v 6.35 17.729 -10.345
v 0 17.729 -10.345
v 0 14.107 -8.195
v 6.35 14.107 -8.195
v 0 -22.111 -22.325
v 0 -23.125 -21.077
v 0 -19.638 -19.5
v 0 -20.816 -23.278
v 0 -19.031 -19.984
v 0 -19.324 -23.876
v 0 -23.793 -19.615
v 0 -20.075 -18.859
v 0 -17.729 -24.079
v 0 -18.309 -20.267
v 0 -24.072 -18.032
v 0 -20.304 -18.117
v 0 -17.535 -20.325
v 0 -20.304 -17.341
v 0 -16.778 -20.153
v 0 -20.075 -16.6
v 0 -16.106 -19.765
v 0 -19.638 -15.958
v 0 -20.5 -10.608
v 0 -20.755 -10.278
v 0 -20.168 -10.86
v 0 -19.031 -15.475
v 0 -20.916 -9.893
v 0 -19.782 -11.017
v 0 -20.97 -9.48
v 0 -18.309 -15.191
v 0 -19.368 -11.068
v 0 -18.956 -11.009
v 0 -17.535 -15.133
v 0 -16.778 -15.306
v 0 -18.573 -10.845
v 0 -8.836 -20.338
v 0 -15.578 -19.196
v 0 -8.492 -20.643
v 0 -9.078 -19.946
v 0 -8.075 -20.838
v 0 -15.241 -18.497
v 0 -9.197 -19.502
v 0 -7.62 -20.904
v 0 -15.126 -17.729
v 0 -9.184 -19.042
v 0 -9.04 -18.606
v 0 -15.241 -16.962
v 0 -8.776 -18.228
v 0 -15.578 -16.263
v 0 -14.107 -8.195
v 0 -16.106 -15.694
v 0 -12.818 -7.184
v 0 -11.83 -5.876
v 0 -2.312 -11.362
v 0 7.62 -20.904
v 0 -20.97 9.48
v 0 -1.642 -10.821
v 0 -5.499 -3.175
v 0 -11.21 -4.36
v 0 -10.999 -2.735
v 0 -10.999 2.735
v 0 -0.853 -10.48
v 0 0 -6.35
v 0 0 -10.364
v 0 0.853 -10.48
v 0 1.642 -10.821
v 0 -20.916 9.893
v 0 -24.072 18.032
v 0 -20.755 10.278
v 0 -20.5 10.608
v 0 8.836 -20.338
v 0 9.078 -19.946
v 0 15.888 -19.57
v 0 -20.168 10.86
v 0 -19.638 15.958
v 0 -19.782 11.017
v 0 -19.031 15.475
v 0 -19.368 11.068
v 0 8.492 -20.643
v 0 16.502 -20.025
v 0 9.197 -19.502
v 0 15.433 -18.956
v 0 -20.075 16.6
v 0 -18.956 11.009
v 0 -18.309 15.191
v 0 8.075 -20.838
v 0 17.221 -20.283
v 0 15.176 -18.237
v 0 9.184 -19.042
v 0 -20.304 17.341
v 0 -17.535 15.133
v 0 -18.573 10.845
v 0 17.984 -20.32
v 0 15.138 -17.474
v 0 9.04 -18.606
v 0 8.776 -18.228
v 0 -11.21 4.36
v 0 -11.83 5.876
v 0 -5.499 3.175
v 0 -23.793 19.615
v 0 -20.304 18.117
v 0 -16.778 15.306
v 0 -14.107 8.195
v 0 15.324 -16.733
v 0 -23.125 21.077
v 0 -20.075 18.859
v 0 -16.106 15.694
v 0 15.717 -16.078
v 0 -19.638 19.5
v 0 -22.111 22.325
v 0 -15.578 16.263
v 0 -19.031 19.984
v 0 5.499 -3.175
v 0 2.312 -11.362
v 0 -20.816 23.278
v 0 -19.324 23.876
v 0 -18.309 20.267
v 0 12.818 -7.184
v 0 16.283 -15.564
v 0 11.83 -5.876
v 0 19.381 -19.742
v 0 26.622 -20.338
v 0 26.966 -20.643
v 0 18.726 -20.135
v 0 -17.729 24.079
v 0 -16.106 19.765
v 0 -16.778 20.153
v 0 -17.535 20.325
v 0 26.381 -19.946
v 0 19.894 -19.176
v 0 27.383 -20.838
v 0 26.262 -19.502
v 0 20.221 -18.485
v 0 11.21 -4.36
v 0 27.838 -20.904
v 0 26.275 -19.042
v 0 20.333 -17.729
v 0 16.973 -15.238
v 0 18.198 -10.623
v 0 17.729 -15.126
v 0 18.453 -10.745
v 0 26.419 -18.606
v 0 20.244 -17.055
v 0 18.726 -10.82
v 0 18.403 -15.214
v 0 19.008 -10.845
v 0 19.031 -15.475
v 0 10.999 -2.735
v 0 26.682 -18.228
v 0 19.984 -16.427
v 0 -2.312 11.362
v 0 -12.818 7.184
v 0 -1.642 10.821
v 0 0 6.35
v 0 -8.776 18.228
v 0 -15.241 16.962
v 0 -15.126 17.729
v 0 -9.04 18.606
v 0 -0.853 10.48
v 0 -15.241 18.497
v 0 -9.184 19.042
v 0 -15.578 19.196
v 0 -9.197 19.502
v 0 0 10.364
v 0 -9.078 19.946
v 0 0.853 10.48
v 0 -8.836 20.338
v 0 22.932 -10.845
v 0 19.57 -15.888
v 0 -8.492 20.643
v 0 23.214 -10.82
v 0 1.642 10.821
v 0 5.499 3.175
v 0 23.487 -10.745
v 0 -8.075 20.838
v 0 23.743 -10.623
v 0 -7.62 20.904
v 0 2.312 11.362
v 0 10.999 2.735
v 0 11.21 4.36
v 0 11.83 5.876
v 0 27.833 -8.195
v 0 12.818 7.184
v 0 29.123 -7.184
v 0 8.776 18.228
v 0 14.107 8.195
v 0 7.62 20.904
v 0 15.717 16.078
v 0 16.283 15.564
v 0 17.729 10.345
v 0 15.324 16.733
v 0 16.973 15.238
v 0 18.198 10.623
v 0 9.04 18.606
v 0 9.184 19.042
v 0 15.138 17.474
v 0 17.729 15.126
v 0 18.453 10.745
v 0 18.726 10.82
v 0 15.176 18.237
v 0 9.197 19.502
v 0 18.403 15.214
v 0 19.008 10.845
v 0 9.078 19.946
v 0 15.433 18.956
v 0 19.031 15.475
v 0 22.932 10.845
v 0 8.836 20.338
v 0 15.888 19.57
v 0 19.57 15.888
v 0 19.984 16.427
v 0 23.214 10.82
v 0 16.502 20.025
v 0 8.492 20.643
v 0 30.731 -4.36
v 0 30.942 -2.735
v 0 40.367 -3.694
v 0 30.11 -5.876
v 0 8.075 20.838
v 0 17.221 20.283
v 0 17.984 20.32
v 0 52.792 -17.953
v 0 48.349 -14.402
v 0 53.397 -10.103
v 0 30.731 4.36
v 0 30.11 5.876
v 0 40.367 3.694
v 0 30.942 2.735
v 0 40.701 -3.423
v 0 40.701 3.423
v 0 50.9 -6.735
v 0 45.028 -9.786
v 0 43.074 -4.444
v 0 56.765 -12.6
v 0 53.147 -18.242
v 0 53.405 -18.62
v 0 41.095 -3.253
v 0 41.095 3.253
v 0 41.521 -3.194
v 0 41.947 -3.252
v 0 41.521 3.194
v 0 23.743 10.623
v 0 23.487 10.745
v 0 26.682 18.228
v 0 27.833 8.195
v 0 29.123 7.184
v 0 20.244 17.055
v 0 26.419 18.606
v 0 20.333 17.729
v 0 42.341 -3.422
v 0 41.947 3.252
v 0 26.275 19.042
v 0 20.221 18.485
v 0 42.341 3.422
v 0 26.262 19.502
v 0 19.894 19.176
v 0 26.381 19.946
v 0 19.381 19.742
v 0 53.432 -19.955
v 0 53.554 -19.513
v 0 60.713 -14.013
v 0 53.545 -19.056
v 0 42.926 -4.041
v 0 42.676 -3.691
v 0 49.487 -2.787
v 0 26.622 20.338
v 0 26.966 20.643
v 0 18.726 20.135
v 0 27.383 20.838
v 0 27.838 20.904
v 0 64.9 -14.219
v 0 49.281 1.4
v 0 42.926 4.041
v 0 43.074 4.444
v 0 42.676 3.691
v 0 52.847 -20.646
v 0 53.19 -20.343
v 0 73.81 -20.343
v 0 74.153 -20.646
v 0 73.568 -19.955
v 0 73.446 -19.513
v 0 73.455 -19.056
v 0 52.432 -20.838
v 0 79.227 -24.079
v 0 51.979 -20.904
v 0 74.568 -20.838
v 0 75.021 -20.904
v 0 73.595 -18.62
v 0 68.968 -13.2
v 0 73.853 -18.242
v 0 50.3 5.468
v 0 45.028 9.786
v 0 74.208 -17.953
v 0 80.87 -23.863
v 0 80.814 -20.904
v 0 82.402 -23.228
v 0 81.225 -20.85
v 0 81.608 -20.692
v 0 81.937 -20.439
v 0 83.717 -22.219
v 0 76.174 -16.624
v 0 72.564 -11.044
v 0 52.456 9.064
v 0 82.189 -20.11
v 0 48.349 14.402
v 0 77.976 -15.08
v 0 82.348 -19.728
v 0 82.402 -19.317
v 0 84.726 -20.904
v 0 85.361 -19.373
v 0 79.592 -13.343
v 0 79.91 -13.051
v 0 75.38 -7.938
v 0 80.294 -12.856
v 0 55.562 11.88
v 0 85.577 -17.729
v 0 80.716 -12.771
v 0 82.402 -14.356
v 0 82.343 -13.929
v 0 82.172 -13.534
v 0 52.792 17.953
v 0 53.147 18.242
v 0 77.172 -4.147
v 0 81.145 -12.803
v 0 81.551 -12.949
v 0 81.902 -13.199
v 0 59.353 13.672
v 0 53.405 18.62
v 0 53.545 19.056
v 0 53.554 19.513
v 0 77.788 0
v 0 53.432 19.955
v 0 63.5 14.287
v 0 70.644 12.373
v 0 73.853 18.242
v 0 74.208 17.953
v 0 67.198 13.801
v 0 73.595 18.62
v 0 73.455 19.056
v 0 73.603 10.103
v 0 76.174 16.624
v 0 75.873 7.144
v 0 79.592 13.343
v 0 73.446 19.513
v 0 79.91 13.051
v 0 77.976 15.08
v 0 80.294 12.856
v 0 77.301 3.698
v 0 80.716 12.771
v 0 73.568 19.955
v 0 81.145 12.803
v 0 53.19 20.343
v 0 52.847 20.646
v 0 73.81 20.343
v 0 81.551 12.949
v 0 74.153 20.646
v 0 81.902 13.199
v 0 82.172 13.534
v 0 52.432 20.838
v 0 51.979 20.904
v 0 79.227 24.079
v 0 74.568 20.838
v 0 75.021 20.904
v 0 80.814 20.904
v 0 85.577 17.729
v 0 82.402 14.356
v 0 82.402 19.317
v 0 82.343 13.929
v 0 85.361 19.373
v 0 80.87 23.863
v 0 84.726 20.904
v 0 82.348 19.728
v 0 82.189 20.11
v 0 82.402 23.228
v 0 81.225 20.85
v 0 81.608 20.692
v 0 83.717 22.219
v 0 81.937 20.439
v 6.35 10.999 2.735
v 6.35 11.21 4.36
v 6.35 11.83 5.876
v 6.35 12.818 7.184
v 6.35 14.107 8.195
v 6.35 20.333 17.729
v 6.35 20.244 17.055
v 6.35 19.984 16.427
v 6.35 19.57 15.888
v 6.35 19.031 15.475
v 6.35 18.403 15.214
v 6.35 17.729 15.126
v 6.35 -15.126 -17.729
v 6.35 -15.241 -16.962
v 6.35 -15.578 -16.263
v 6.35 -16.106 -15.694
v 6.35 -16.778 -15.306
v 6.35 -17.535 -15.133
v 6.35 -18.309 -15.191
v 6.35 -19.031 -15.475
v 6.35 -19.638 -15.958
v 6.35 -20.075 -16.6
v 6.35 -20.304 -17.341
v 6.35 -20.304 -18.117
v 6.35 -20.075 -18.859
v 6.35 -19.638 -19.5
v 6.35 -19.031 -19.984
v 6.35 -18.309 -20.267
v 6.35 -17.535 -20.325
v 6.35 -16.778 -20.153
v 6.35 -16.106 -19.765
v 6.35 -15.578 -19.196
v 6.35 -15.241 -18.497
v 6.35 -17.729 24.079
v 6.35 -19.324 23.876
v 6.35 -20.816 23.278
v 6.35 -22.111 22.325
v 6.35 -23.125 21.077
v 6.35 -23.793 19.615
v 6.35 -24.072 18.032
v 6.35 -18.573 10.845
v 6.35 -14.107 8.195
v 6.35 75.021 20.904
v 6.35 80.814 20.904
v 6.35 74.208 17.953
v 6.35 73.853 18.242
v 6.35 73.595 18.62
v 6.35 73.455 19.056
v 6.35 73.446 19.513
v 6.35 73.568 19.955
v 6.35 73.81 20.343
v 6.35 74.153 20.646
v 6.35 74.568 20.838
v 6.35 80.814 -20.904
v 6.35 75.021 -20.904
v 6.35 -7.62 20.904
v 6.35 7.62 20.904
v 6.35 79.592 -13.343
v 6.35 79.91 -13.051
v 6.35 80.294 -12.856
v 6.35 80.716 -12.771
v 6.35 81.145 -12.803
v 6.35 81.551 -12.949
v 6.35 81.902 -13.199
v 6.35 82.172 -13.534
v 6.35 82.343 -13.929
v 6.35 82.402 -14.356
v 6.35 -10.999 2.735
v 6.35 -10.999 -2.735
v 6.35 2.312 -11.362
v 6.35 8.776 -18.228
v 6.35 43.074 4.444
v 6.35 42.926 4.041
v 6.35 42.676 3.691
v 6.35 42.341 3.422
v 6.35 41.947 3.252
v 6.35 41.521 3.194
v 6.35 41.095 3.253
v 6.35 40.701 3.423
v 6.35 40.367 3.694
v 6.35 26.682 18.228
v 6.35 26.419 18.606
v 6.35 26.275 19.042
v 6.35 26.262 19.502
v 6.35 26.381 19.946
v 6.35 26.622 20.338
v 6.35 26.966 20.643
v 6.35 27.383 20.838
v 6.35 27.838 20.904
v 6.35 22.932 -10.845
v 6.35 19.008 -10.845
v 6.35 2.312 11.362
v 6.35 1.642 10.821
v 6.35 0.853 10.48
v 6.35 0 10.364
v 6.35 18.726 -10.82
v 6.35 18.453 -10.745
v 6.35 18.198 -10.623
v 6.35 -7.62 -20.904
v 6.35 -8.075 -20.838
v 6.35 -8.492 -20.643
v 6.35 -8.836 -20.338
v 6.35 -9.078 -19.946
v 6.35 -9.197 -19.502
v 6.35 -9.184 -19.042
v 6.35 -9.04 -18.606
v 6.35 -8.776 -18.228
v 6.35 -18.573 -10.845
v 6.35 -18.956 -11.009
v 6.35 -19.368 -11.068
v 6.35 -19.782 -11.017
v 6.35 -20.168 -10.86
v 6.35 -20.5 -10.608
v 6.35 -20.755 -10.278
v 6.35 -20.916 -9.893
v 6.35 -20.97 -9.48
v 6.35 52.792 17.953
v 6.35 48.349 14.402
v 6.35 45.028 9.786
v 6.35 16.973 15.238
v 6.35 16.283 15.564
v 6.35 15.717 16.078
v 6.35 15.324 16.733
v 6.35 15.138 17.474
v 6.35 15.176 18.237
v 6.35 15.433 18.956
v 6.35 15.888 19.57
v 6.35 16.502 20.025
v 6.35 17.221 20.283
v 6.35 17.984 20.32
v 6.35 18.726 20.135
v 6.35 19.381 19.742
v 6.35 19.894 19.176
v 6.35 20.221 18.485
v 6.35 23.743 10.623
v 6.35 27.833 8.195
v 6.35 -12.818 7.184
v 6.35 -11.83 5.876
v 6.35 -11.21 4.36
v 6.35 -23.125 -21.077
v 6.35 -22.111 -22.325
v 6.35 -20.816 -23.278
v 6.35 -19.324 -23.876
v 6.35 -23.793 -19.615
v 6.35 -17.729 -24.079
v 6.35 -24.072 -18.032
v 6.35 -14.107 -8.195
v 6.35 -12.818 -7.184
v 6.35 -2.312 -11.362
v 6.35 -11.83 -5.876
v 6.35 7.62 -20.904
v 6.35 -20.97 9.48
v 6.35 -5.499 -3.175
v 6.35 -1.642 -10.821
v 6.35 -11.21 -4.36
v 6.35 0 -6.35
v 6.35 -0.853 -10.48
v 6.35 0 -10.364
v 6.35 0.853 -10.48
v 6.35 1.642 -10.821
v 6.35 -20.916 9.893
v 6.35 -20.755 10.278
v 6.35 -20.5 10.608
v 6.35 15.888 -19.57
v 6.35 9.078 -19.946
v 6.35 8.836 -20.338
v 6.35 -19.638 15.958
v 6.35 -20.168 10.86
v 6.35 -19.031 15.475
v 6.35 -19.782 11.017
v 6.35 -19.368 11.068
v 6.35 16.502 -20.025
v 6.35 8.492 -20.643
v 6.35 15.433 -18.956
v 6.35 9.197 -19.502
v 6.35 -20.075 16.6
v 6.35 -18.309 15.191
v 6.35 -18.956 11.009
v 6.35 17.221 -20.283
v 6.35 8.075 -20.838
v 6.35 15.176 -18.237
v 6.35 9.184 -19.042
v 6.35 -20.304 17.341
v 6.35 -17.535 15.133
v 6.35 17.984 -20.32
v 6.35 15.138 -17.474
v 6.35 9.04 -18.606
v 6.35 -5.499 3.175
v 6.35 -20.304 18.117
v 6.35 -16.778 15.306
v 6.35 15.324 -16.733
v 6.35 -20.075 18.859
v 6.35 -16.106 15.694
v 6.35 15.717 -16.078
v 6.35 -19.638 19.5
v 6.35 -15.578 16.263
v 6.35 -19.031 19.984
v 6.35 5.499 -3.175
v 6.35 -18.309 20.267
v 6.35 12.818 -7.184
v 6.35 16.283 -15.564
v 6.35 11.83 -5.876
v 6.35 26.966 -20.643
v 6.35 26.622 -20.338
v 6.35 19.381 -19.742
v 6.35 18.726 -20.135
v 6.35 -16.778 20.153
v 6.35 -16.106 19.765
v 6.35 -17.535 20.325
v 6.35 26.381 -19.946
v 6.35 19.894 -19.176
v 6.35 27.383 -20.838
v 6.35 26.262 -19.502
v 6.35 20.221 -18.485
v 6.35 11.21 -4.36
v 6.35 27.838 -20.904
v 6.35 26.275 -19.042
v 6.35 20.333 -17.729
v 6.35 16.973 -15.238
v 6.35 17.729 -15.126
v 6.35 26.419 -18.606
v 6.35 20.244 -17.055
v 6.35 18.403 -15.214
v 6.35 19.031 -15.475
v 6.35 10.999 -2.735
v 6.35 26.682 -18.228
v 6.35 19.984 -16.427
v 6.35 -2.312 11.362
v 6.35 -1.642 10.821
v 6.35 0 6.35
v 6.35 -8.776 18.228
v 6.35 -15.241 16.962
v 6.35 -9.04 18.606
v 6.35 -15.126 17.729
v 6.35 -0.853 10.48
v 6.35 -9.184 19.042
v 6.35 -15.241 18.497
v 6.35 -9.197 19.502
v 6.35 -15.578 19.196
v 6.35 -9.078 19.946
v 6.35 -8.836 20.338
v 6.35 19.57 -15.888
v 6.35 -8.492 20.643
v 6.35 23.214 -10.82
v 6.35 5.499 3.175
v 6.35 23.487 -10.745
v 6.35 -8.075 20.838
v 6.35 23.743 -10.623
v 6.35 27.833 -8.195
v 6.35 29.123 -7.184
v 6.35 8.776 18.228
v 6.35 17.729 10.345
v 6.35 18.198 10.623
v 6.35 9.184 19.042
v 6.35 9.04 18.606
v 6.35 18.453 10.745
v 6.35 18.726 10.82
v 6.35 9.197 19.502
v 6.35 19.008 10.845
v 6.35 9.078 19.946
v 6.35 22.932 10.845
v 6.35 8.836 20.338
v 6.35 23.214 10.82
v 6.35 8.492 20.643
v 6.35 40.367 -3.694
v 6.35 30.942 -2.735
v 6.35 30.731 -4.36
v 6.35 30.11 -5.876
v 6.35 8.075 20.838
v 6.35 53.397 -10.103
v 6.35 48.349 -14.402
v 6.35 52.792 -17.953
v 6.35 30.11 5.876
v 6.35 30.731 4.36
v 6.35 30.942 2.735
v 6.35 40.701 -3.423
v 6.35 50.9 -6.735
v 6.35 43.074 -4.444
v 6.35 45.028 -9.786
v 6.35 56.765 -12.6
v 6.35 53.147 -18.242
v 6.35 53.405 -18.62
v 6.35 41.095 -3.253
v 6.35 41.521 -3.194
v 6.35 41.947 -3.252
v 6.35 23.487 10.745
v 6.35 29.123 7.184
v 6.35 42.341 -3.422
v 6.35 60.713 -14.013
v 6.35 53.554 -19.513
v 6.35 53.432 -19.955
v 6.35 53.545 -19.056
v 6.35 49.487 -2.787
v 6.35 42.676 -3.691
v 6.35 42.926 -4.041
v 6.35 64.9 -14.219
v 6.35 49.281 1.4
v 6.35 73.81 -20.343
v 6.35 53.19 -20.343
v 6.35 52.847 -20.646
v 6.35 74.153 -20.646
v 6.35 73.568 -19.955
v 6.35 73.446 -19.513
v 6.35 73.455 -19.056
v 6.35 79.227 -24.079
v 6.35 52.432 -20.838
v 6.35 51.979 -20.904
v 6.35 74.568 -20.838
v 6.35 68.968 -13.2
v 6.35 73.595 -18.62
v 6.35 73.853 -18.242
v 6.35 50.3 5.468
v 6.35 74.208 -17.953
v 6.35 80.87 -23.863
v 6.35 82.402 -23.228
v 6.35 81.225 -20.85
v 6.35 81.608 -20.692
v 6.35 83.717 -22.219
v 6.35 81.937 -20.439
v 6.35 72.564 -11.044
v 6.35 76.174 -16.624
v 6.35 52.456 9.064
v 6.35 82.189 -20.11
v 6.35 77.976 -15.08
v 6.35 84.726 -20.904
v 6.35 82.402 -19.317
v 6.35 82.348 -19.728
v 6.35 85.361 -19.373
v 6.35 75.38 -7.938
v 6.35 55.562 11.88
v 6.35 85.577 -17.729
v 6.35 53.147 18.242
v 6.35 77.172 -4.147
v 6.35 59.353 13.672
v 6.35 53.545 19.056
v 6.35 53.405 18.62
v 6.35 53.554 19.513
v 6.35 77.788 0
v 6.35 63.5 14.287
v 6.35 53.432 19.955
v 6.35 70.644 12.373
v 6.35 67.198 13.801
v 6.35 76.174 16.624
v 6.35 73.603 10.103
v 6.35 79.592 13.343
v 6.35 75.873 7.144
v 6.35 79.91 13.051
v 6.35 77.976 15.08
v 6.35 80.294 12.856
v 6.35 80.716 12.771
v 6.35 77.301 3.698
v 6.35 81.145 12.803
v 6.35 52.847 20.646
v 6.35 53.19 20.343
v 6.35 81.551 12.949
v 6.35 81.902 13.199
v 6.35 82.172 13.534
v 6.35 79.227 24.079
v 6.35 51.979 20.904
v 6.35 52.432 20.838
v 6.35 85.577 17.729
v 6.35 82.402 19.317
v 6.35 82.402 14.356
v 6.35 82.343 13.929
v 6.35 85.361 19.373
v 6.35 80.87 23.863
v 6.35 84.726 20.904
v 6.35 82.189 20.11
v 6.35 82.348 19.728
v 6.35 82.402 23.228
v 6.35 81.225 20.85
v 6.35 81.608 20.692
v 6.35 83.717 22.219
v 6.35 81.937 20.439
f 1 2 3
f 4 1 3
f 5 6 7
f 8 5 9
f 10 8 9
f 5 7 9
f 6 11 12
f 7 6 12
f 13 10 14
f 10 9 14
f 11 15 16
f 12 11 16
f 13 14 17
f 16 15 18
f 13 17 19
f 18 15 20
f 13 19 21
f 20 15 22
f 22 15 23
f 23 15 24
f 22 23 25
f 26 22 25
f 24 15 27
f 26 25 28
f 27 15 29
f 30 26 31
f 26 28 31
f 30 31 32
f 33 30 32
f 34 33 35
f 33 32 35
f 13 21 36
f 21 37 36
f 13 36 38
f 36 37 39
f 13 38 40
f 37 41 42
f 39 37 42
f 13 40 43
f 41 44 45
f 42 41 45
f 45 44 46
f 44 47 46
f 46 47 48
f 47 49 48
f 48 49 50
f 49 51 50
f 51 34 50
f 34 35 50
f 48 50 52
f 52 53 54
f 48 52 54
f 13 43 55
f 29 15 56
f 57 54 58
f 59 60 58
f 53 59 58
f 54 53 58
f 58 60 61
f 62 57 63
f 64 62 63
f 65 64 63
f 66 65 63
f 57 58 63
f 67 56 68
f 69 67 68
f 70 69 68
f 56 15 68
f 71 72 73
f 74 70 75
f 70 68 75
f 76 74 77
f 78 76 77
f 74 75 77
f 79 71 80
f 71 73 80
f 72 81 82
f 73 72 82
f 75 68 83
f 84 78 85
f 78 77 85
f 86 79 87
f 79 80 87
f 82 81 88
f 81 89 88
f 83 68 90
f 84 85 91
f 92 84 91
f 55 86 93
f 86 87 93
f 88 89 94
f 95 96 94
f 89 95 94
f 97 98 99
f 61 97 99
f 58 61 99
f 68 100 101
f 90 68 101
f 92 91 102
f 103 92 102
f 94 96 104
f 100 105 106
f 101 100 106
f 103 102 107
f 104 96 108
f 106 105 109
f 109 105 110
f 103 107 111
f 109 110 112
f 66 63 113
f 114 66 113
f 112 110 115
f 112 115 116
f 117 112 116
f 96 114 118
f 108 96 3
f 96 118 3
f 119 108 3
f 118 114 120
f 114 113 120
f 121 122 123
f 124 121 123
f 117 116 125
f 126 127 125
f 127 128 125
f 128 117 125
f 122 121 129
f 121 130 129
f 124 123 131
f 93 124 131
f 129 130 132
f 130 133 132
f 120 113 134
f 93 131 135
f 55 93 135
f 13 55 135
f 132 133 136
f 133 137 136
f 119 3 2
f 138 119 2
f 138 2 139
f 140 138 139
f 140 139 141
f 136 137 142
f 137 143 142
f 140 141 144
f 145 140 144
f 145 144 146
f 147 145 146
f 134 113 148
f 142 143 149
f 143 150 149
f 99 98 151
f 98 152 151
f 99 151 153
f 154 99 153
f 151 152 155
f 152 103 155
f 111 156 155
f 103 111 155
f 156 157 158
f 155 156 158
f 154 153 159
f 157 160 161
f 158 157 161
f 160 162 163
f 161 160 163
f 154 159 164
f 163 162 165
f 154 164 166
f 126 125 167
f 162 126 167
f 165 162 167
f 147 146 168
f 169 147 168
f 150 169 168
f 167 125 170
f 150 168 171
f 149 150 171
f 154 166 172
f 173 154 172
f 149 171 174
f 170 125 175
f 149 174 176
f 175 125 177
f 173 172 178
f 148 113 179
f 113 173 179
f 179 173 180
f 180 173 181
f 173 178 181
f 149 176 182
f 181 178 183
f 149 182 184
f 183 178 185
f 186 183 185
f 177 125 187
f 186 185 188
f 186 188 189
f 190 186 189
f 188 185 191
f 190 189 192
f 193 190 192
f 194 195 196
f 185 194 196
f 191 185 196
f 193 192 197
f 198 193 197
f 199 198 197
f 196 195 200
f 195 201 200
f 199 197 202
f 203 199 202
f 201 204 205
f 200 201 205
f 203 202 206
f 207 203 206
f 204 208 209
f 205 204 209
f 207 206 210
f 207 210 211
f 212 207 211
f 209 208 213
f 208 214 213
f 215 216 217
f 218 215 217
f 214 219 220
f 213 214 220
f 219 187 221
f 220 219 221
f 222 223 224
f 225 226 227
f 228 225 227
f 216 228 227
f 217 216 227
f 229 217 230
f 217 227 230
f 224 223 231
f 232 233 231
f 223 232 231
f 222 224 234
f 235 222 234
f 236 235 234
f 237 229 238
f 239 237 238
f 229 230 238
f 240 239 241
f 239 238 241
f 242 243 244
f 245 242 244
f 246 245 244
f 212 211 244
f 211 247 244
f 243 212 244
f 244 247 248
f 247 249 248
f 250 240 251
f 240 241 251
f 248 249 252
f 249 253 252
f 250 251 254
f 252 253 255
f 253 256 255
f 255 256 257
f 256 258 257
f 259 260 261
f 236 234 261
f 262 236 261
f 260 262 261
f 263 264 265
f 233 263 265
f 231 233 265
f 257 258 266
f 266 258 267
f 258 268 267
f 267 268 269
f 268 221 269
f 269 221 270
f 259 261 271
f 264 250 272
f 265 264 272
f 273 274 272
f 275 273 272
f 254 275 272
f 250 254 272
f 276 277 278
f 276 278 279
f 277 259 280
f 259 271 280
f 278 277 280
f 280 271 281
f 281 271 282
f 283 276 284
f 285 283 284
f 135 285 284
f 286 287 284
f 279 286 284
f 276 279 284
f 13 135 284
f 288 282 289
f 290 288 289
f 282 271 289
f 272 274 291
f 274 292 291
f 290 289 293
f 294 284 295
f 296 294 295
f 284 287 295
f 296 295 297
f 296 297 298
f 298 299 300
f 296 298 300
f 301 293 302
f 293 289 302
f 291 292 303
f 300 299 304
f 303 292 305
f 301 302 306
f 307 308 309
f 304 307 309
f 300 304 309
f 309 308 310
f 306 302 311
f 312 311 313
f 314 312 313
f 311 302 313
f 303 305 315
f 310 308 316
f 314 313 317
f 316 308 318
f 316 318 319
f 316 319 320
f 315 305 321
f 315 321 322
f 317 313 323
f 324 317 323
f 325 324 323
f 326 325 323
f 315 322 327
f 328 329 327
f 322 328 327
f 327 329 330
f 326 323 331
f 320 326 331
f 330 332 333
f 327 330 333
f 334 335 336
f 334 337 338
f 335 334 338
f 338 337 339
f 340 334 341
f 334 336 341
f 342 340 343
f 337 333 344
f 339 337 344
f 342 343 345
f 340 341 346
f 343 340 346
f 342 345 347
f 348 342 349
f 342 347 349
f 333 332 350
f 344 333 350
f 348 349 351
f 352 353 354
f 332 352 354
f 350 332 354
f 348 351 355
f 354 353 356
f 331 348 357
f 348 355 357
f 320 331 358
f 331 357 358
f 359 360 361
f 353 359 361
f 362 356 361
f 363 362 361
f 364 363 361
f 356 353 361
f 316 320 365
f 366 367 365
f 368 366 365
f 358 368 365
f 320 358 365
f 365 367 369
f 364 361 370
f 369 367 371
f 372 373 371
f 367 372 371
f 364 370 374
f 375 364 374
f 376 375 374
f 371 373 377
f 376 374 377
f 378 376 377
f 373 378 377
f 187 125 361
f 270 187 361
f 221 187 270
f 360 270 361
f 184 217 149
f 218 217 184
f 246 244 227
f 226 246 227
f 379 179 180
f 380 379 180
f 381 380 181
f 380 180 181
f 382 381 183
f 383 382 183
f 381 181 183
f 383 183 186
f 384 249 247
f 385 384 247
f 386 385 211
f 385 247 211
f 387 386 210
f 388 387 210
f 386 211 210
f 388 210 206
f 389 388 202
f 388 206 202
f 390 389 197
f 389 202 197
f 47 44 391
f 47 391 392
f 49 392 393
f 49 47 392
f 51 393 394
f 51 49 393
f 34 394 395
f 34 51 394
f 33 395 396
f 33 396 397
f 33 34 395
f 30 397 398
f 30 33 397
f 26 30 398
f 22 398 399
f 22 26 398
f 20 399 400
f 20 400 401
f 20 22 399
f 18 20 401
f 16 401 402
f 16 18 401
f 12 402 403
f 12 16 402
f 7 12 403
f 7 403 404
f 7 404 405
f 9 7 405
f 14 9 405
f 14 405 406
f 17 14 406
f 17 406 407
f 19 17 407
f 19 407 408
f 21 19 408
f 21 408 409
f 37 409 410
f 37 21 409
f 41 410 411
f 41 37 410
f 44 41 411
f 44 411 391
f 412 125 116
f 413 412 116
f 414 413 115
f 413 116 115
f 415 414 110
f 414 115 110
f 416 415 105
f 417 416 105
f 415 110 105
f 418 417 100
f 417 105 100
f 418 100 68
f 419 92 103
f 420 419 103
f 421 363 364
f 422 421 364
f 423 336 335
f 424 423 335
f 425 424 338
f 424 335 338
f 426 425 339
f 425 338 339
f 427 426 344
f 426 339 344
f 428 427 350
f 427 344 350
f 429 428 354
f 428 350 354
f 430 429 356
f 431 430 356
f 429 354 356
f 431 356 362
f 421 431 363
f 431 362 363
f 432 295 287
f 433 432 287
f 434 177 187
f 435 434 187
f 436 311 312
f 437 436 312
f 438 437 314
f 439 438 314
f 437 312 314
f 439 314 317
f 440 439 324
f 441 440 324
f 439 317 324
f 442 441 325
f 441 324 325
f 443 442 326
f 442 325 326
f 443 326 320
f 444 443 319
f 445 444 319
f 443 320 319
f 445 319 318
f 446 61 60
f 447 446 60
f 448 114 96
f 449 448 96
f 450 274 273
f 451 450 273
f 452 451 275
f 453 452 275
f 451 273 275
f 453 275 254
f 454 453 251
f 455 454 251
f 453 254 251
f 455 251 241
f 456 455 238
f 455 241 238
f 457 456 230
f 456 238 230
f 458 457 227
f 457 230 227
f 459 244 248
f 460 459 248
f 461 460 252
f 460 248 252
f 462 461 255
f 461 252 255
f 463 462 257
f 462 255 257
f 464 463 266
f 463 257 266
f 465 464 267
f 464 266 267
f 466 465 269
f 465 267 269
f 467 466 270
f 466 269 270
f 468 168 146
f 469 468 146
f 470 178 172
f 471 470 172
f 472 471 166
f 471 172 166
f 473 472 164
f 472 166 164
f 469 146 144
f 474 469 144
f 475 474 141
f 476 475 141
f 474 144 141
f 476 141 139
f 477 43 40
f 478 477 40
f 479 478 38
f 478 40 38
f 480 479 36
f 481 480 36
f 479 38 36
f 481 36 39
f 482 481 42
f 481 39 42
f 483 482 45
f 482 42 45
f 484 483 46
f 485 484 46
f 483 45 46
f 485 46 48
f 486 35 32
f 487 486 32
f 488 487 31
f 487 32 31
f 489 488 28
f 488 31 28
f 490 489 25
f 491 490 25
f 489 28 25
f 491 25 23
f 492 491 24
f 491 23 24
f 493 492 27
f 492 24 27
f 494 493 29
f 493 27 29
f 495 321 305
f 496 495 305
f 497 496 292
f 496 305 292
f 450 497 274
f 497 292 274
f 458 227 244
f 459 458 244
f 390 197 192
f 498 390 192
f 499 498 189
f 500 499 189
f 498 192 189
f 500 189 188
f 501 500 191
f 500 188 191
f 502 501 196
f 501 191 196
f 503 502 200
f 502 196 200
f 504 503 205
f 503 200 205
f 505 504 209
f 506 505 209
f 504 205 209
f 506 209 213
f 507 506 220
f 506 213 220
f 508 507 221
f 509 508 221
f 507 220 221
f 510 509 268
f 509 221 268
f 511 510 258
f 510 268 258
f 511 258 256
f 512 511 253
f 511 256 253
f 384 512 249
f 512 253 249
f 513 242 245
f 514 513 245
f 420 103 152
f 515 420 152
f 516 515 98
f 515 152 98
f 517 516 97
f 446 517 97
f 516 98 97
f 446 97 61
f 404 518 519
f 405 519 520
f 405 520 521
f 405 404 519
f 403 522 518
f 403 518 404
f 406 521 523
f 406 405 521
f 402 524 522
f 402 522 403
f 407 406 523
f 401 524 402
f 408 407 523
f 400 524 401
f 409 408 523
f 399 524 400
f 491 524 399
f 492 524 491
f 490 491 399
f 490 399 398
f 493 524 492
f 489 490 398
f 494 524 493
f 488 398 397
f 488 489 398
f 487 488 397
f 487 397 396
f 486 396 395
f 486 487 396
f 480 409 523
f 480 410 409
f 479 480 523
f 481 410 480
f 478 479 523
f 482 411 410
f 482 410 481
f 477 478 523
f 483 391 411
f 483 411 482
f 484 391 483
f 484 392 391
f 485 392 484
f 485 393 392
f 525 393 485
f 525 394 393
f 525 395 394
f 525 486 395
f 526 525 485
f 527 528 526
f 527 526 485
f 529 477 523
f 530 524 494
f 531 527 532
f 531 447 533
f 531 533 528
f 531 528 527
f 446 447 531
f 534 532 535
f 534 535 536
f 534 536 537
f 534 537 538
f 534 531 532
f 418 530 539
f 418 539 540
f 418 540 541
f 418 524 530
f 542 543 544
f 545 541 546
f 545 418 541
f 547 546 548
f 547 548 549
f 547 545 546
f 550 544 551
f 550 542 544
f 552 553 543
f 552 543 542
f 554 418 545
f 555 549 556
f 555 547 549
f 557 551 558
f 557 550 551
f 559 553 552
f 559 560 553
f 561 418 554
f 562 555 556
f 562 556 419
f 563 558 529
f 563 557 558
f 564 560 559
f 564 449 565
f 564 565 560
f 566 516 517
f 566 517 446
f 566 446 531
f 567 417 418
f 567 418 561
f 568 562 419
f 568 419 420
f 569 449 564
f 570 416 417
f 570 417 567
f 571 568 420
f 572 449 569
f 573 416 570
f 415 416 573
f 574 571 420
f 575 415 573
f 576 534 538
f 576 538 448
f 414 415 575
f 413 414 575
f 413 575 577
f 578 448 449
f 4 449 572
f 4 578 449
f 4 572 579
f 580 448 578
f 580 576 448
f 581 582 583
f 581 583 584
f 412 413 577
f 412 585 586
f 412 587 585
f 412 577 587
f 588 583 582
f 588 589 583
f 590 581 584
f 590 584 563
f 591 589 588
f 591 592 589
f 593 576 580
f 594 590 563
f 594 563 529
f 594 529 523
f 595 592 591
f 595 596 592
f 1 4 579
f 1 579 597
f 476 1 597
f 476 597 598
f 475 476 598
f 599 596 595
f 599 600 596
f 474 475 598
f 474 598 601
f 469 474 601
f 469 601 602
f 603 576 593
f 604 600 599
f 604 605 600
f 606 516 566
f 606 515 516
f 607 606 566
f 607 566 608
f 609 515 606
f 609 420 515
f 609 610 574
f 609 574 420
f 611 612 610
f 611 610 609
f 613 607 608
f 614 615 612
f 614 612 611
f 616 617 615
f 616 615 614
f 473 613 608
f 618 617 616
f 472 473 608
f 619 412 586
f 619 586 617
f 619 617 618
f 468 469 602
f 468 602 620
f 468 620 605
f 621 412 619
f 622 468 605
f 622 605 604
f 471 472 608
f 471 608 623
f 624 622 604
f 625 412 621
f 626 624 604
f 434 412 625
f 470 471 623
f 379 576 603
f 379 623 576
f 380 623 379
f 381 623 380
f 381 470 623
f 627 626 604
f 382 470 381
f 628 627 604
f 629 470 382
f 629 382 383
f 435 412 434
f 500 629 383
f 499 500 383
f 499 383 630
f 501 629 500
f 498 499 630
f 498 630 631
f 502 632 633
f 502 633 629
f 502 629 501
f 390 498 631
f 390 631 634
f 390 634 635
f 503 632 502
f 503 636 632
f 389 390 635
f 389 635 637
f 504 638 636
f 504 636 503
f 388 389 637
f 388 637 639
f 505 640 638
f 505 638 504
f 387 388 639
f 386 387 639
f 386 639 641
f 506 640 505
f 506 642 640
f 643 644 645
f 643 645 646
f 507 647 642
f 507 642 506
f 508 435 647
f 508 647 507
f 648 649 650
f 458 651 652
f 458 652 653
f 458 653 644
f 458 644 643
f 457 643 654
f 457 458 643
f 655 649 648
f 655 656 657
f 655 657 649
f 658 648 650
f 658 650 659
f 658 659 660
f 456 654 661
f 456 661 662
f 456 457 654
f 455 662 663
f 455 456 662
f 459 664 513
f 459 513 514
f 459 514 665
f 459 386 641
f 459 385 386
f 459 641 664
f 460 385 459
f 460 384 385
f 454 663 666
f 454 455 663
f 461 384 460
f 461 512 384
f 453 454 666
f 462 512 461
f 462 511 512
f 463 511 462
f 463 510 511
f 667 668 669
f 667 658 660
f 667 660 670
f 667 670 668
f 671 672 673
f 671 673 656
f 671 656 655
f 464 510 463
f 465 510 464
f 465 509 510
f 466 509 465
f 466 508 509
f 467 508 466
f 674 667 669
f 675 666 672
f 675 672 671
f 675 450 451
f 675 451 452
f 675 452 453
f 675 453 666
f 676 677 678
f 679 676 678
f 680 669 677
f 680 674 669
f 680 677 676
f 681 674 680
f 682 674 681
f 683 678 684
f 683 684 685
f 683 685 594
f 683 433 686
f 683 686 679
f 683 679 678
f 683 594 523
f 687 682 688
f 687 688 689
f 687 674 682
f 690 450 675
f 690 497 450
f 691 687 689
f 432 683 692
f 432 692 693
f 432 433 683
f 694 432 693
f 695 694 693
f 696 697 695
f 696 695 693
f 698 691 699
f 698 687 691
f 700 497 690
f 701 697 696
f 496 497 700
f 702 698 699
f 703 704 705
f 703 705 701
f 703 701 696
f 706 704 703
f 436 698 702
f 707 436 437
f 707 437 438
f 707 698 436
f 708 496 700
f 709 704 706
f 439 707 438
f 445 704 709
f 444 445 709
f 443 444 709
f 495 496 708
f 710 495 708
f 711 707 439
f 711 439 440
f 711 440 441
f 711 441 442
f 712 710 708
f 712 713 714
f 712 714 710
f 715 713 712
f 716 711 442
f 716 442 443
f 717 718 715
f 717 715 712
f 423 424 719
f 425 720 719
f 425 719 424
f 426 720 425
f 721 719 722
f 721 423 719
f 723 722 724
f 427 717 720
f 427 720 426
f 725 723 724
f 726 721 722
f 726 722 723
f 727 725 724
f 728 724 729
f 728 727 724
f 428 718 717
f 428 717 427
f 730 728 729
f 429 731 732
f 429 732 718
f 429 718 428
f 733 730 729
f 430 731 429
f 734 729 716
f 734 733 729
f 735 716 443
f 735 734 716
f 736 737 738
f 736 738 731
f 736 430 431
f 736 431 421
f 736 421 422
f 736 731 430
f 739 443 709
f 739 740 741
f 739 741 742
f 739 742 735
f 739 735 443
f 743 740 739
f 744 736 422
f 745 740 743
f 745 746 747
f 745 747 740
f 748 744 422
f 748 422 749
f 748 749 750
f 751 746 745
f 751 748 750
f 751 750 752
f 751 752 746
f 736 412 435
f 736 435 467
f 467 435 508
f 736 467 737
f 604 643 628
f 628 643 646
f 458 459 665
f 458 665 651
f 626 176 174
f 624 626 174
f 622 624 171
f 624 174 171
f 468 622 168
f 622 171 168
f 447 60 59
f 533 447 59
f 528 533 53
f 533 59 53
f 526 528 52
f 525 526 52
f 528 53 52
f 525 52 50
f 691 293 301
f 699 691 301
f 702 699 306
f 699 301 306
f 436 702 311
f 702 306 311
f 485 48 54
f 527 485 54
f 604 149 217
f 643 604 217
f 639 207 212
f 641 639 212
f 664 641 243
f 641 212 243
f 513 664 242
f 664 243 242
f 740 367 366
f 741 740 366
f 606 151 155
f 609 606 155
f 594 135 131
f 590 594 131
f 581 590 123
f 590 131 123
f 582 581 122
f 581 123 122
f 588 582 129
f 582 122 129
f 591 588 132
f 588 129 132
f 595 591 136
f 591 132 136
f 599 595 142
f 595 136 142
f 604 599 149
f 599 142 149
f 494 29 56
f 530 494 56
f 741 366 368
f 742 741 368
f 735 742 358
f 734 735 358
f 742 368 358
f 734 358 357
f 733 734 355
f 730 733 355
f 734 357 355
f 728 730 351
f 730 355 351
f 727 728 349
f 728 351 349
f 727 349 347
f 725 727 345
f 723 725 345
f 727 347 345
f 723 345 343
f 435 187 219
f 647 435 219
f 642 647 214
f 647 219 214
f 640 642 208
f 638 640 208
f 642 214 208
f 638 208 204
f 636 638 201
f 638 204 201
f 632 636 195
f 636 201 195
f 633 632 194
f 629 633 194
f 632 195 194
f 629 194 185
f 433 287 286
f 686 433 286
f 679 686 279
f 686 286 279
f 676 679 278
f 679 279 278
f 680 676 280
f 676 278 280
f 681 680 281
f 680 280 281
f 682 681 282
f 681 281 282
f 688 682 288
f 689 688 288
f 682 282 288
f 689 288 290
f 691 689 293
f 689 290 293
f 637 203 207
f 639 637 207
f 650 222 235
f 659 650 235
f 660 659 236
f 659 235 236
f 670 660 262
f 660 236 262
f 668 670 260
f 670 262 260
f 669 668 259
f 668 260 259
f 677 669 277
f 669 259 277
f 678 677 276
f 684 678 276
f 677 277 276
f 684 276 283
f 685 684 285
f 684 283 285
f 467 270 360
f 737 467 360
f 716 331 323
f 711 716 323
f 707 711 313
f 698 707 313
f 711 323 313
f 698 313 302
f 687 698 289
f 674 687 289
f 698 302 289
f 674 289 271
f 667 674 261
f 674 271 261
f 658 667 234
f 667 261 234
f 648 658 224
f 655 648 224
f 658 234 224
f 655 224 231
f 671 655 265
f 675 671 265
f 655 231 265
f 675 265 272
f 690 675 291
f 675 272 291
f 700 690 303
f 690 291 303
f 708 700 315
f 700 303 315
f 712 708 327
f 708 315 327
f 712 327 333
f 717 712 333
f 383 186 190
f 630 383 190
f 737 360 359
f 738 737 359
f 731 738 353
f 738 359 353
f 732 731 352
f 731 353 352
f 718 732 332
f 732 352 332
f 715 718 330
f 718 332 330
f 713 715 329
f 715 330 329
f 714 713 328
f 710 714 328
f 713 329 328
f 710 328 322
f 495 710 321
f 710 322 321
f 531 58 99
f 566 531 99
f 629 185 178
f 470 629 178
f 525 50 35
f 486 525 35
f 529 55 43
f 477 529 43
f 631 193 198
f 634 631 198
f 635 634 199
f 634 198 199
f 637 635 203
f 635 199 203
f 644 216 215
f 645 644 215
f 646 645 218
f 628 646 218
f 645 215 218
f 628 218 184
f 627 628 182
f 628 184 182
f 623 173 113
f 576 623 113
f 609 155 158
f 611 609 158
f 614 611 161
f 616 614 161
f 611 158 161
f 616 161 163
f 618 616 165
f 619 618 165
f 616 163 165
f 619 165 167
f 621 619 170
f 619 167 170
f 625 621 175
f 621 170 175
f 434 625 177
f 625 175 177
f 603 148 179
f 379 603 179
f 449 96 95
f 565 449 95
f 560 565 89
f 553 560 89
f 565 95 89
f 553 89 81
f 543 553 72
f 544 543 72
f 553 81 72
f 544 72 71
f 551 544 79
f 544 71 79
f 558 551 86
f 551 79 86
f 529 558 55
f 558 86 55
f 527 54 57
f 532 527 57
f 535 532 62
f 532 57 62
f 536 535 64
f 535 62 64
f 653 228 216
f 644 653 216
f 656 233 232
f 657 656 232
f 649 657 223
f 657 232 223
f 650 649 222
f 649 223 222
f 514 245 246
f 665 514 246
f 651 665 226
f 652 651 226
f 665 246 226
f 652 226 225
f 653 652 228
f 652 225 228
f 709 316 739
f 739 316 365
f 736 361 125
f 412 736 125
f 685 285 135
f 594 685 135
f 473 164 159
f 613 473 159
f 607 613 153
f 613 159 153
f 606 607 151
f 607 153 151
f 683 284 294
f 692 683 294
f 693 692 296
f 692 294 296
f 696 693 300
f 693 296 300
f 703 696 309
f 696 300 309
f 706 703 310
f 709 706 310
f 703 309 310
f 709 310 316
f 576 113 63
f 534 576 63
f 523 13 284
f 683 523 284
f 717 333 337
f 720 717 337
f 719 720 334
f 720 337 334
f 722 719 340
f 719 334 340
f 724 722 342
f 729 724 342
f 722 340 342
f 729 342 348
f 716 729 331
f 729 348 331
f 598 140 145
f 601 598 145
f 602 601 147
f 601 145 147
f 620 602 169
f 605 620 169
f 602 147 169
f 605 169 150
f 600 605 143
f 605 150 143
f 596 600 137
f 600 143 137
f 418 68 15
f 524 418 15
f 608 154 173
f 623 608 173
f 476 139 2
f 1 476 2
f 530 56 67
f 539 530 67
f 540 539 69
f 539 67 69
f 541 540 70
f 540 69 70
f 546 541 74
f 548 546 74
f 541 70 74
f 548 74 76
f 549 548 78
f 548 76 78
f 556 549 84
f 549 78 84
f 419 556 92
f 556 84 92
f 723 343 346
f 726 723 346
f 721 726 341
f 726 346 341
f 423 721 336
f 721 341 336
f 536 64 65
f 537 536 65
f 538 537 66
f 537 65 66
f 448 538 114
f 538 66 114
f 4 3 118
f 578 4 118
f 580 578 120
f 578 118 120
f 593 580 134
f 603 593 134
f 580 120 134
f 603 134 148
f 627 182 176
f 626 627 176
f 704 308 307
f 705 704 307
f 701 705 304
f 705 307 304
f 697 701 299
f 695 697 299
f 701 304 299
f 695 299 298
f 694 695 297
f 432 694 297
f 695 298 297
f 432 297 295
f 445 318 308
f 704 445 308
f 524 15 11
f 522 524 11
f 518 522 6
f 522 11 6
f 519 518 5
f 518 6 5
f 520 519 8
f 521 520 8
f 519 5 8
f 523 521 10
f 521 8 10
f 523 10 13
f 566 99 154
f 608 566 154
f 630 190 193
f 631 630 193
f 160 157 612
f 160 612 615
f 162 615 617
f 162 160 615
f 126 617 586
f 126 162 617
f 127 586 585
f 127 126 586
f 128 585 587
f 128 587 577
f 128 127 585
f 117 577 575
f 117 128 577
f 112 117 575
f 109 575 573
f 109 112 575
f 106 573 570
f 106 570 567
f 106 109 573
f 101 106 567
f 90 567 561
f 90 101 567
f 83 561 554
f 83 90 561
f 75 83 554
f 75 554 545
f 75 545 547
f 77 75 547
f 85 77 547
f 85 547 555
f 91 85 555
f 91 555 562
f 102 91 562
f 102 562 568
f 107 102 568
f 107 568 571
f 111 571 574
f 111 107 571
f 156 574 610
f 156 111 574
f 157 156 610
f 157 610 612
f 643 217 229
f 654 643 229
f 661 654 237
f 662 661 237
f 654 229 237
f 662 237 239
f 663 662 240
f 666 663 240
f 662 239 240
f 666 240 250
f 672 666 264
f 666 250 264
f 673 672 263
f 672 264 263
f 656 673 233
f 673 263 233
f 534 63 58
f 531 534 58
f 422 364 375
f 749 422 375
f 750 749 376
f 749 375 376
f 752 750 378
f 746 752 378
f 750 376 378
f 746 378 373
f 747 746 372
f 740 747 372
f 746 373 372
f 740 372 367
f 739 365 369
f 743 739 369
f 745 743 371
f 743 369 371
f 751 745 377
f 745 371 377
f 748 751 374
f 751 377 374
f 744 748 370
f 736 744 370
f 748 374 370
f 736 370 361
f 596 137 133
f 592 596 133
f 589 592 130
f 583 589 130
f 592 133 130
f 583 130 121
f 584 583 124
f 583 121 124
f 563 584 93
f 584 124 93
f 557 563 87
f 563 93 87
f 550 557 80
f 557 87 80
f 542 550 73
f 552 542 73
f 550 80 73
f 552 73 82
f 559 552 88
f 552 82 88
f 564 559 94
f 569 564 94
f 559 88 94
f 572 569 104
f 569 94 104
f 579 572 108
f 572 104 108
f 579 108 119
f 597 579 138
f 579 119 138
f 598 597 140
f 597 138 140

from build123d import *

# Parameters (mm, degrees)
F0_R     = 2.6035
F1_DEPTH = 6.35


with BuildPart() as f1:
    # F0 (on Right) → F1 (new body)
    with BuildSketch(Plane.YZ):
        with BuildLine():
            Line((-24.071991, 17.426708), (-24.071991, -17.426708))
            Line((-24.071991, -17.426708), (-24.071991, -18.031692))
            ThreePointArc((-24.071991, -18.031692), (-22.111076, -22.325031), (-17.7292, -24.0792))
            Line((-17.7292, -24.0792), (17.7292, -24.0792))
            Line((17.7292, -24.0792), (79.226878, -24.0792))
            ThreePointArc((79.226878, -24.0792), (83.717007, -22.219328), (85.576878, -17.7292))
            Line((85.576878, -17.7292), (85.576878, 17.7292))
            ThreePointArc((85.576878, 17.7292), (83.717007, 22.219328), (79.226878, 24.0792))
            Line((79.226878, 24.0792), (17.7292, 24.0792))
            Line((17.7292, 24.0792), (-17.7292, 24.0792))
            ThreePointArc((-17.7292, 24.0792), (-22.111076, 22.325031), (-24.071991, 18.031692))
            Line((-24.071991, 18.031692), (-24.071991, 17.426708))
        make_face()
        with Locations((-17.7292, -17.7292)):
            Circle(F0_R, mode=Mode.SUBTRACT)
        with BuildLine():
            ThreePointArc((0, -10.363654), (1.259078, -10.623975), (2.311689, -11.362253))
            Line((2.311689, -11.362253), (8.776098, -18.2285))
            ThreePointArc((8.776098, -18.2285), (9.077593, -19.946239), (7.620254, -20.9042))
            Line((7.620254, -20.9042), (0, -20.9042))
            Line((0, -20.9042), (-7.620254, -20.9042))
            ThreePointArc((-7.620254, -20.9042), (-9.077593, -19.946239), (-8.776098, -18.2285))
            Line((-8.776098, -18.2285), (-2.311689, -11.362253))
            ThreePointArc((-2.311689, -11.362253), (-1.259078, -10.623975), (0, -10.363654))
        make_face(mode=Mode.SUBTRACT)
        with BuildLine():
            ThreePointArc((20.3327, -17.7292), (15.888247, -19.570153), (17.7292, -15.1257))
            ThreePointArc((17.7292, -15.1257), (19.570153, -15.888247), (20.3327, -17.7292))
        make_face(mode=Mode.SUBTRACT)
        with BuildLine():
            Line((51.978643, -20.9042), (27.838146, -20.9042))
            ThreePointArc((27.838146, -20.9042), (26.380807, -19.946239), (26.682302, -18.2285))
            Line((26.682302, -18.2285), (40.366631, -3.693533))
            ThreePointArc((40.366631, -3.693533), (41.946698, -3.251965), (43.073684, -4.444231))
            ThreePointArc((43.073684, -4.444231), (46.530538, -12.207495), (52.791839, -17.953297))
            ThreePointArc((52.791839, -17.953297), (53.509094, -19.738454), (51.978643, -20.9042))
        make_face(mode=Mode.SUBTRACT)
        with BuildLine():
            ThreePointArc((75.021357, -20.9042), (73.490906, -19.738454), (74.208161, -17.953297))
            ThreePointArc((74.208161, -17.953297), (77.097094, -15.877802), (79.592302, -13.342541))
            ThreePointArc((79.592302, -13.342541), (81.352946, -12.862443), (82.401878, -14.355796))
            Line((82.401878, -14.355796), (82.401878, -19.3167))
            ThreePointArc((82.401878, -19.3167), (81.93691, -20.439232), (80.814378, -20.9042))
            Line((80.814378, -20.9042), (75.021357, -20.9042))
        make_face(mode=Mode.SUBTRACT)
        with BuildLine():
            Line((-10.998523, 2.734687), (-10.998523, -2.734687))
            ThreePointArc((-10.998523, -2.734687), (-11.830222, -5.87648), (-14.107455, -8.195271))
            Line((-14.107455, -8.195271), (-18.572501, -10.845448))
            ThreePointArc((-18.572501, -10.845448), (-20.168216, -10.859878), (-20.970268, -9.480302))
            Line((-20.970268, -9.480302), (-20.970268, 9.480302))
            ThreePointArc((-20.970268, 9.480302), (-20.168216, 10.859878), (-18.572501, 10.845448))
            Line((-18.572501, 10.845448), (-14.107455, 8.195271))
            ThreePointArc((-14.107455, 8.195271), (-11.830222, 5.87648), (-10.998523, 2.734687))
        make_face(mode=Mode.SUBTRACT)
        with Locations((-17.7292, 17.7292)):
            Circle(F0_R, mode=Mode.SUBTRACT)
        Polygon((-5.499261, 3.175), (0, 6.35), (5.499261, 3.175), (5.499261, -3.175), (0, -6.35), (-5.499261, -3.175), align=None, mode=Mode.SUBTRACT)
        with BuildLine():
            Line((14.107455, 8.195271), (17.7292, 10.344917))
            Line((17.7292, 10.344917), (18.197877, 10.623095))
            ThreePointArc((18.197877, 10.623095), (18.588032, 10.788851), (19.008143, 10.845448))
            Line((19.008143, 10.845448), (22.932392, 10.845448))
            ThreePointArc((22.932392, 10.845448), (23.352503, 10.788851), (23.742659, 10.623095))
            Line((23.742659, 10.623095), (27.83308, 8.195271))
            ThreePointArc((27.83308, 8.195271), (30.110313, 5.87648), (30.942013, 2.734687))
            Line((30.942013, 2.734687), (30.942013, -2.734687))
            ThreePointArc((30.942013, -2.734687), (30.110313, -5.87648), (27.83308, -8.195271))
            Line((27.83308, -8.195271), (23.742659, -10.623095))
            ThreePointArc((23.742659, -10.623095), (23.352503, -10.788851), (22.932392, -10.845448))
            Line((22.932392, -10.845448), (19.008143, -10.845448))
            ThreePointArc((19.008143, -10.845448), (18.588032, -10.788851), (18.197877, -10.623095))
            Line((18.197877, -10.623095), (17.7292, -10.344917))
            Line((17.7292, -10.344917), (14.107455, -8.195271))
            ThreePointArc((14.107455, -8.195271), (11.830222, -5.87648), (10.998523, -2.734687))
            Line((10.998523, -2.734687), (10.998523, 2.734687))
            ThreePointArc((10.998523, 2.734687), (11.830222, 5.87648), (14.107455, 8.195271))
        make_face(mode=Mode.SUBTRACT)
        with BuildLine():
            ThreePointArc((0, 10.363654), (-1.259078, 10.623975), (-2.311689, 11.362253))
            Line((-2.311689, 11.362253), (-8.776098, 18.2285))
            ThreePointArc((-8.776098, 18.2285), (-9.077593, 19.946239), (-7.620254, 20.9042))
            Line((-7.620254, 20.9042), (0, 20.9042))
            Line((0, 20.9042), (7.620254, 20.9042))
            ThreePointArc((7.620254, 20.9042), (9.077593, 19.946239), (8.776098, 18.2285))
            Line((8.776098, 18.2285), (2.311689, 11.362253))
            ThreePointArc((2.311689, 11.362253), (1.259078, 10.623975), (0, 10.363654))
        make_face(mode=Mode.SUBTRACT)
        with BuildLine():
            ThreePointArc((17.7292, 15.1257), (15.888247, 19.570153), (20.3327, 17.7292))
            ThreePointArc((20.3327, 17.7292), (19.570153, 15.888247), (17.7292, 15.1257))
        make_face(mode=Mode.SUBTRACT)
        with BuildLine():
            ThreePointArc((52.791839, 17.953297), (46.530538, 12.207495), (43.073684, 4.444231))
            ThreePointArc((43.073684, 4.444231), (41.946698, 3.251965), (40.366631, 3.693533))
            Line((40.366631, 3.693533), (26.682302, 18.2285))
            ThreePointArc((26.682302, 18.2285), (26.380807, 19.946239), (27.838146, 20.9042))
            Line((27.838146, 20.9042), (51.978643, 20.9042))
            ThreePointArc((51.978643, 20.9042), (53.509094, 19.738454), (52.791839, 17.953297))
        make_face(mode=Mode.SUBTRACT)
        with BuildLine():
            ThreePointArc((63.5, 14.2875), (73.602788, 10.102788), (77.7875, 0))
            ThreePointArc((77.7875, 0), (53.397212, -10.102788), (63.5, 14.2875))
        make_face(mode=Mode.SUBTRACT)
        with BuildLine():
            ThreePointArc((74.208161, 17.953297), (73.490906, 19.738454), (75.021357, 20.9042))
            Line((75.021357, 20.9042), (80.814378, 20.9042))
            ThreePointArc((80.814378, 20.9042), (81.93691, 20.439232), (82.401878, 19.3167))
            Line((82.401878, 19.3167), (82.401878, 14.355796))
            ThreePointArc((82.401878, 14.355796), (81.352946, 12.862443), (79.592302, 13.342541))
            ThreePointArc((79.592302, 13.342541), (77.097094, 15.877802), (74.208161, 17.953297))
        make_face(mode=Mode.SUBTRACT)
    extrude(amount=F1_DEPTH)


solid = f1.part
